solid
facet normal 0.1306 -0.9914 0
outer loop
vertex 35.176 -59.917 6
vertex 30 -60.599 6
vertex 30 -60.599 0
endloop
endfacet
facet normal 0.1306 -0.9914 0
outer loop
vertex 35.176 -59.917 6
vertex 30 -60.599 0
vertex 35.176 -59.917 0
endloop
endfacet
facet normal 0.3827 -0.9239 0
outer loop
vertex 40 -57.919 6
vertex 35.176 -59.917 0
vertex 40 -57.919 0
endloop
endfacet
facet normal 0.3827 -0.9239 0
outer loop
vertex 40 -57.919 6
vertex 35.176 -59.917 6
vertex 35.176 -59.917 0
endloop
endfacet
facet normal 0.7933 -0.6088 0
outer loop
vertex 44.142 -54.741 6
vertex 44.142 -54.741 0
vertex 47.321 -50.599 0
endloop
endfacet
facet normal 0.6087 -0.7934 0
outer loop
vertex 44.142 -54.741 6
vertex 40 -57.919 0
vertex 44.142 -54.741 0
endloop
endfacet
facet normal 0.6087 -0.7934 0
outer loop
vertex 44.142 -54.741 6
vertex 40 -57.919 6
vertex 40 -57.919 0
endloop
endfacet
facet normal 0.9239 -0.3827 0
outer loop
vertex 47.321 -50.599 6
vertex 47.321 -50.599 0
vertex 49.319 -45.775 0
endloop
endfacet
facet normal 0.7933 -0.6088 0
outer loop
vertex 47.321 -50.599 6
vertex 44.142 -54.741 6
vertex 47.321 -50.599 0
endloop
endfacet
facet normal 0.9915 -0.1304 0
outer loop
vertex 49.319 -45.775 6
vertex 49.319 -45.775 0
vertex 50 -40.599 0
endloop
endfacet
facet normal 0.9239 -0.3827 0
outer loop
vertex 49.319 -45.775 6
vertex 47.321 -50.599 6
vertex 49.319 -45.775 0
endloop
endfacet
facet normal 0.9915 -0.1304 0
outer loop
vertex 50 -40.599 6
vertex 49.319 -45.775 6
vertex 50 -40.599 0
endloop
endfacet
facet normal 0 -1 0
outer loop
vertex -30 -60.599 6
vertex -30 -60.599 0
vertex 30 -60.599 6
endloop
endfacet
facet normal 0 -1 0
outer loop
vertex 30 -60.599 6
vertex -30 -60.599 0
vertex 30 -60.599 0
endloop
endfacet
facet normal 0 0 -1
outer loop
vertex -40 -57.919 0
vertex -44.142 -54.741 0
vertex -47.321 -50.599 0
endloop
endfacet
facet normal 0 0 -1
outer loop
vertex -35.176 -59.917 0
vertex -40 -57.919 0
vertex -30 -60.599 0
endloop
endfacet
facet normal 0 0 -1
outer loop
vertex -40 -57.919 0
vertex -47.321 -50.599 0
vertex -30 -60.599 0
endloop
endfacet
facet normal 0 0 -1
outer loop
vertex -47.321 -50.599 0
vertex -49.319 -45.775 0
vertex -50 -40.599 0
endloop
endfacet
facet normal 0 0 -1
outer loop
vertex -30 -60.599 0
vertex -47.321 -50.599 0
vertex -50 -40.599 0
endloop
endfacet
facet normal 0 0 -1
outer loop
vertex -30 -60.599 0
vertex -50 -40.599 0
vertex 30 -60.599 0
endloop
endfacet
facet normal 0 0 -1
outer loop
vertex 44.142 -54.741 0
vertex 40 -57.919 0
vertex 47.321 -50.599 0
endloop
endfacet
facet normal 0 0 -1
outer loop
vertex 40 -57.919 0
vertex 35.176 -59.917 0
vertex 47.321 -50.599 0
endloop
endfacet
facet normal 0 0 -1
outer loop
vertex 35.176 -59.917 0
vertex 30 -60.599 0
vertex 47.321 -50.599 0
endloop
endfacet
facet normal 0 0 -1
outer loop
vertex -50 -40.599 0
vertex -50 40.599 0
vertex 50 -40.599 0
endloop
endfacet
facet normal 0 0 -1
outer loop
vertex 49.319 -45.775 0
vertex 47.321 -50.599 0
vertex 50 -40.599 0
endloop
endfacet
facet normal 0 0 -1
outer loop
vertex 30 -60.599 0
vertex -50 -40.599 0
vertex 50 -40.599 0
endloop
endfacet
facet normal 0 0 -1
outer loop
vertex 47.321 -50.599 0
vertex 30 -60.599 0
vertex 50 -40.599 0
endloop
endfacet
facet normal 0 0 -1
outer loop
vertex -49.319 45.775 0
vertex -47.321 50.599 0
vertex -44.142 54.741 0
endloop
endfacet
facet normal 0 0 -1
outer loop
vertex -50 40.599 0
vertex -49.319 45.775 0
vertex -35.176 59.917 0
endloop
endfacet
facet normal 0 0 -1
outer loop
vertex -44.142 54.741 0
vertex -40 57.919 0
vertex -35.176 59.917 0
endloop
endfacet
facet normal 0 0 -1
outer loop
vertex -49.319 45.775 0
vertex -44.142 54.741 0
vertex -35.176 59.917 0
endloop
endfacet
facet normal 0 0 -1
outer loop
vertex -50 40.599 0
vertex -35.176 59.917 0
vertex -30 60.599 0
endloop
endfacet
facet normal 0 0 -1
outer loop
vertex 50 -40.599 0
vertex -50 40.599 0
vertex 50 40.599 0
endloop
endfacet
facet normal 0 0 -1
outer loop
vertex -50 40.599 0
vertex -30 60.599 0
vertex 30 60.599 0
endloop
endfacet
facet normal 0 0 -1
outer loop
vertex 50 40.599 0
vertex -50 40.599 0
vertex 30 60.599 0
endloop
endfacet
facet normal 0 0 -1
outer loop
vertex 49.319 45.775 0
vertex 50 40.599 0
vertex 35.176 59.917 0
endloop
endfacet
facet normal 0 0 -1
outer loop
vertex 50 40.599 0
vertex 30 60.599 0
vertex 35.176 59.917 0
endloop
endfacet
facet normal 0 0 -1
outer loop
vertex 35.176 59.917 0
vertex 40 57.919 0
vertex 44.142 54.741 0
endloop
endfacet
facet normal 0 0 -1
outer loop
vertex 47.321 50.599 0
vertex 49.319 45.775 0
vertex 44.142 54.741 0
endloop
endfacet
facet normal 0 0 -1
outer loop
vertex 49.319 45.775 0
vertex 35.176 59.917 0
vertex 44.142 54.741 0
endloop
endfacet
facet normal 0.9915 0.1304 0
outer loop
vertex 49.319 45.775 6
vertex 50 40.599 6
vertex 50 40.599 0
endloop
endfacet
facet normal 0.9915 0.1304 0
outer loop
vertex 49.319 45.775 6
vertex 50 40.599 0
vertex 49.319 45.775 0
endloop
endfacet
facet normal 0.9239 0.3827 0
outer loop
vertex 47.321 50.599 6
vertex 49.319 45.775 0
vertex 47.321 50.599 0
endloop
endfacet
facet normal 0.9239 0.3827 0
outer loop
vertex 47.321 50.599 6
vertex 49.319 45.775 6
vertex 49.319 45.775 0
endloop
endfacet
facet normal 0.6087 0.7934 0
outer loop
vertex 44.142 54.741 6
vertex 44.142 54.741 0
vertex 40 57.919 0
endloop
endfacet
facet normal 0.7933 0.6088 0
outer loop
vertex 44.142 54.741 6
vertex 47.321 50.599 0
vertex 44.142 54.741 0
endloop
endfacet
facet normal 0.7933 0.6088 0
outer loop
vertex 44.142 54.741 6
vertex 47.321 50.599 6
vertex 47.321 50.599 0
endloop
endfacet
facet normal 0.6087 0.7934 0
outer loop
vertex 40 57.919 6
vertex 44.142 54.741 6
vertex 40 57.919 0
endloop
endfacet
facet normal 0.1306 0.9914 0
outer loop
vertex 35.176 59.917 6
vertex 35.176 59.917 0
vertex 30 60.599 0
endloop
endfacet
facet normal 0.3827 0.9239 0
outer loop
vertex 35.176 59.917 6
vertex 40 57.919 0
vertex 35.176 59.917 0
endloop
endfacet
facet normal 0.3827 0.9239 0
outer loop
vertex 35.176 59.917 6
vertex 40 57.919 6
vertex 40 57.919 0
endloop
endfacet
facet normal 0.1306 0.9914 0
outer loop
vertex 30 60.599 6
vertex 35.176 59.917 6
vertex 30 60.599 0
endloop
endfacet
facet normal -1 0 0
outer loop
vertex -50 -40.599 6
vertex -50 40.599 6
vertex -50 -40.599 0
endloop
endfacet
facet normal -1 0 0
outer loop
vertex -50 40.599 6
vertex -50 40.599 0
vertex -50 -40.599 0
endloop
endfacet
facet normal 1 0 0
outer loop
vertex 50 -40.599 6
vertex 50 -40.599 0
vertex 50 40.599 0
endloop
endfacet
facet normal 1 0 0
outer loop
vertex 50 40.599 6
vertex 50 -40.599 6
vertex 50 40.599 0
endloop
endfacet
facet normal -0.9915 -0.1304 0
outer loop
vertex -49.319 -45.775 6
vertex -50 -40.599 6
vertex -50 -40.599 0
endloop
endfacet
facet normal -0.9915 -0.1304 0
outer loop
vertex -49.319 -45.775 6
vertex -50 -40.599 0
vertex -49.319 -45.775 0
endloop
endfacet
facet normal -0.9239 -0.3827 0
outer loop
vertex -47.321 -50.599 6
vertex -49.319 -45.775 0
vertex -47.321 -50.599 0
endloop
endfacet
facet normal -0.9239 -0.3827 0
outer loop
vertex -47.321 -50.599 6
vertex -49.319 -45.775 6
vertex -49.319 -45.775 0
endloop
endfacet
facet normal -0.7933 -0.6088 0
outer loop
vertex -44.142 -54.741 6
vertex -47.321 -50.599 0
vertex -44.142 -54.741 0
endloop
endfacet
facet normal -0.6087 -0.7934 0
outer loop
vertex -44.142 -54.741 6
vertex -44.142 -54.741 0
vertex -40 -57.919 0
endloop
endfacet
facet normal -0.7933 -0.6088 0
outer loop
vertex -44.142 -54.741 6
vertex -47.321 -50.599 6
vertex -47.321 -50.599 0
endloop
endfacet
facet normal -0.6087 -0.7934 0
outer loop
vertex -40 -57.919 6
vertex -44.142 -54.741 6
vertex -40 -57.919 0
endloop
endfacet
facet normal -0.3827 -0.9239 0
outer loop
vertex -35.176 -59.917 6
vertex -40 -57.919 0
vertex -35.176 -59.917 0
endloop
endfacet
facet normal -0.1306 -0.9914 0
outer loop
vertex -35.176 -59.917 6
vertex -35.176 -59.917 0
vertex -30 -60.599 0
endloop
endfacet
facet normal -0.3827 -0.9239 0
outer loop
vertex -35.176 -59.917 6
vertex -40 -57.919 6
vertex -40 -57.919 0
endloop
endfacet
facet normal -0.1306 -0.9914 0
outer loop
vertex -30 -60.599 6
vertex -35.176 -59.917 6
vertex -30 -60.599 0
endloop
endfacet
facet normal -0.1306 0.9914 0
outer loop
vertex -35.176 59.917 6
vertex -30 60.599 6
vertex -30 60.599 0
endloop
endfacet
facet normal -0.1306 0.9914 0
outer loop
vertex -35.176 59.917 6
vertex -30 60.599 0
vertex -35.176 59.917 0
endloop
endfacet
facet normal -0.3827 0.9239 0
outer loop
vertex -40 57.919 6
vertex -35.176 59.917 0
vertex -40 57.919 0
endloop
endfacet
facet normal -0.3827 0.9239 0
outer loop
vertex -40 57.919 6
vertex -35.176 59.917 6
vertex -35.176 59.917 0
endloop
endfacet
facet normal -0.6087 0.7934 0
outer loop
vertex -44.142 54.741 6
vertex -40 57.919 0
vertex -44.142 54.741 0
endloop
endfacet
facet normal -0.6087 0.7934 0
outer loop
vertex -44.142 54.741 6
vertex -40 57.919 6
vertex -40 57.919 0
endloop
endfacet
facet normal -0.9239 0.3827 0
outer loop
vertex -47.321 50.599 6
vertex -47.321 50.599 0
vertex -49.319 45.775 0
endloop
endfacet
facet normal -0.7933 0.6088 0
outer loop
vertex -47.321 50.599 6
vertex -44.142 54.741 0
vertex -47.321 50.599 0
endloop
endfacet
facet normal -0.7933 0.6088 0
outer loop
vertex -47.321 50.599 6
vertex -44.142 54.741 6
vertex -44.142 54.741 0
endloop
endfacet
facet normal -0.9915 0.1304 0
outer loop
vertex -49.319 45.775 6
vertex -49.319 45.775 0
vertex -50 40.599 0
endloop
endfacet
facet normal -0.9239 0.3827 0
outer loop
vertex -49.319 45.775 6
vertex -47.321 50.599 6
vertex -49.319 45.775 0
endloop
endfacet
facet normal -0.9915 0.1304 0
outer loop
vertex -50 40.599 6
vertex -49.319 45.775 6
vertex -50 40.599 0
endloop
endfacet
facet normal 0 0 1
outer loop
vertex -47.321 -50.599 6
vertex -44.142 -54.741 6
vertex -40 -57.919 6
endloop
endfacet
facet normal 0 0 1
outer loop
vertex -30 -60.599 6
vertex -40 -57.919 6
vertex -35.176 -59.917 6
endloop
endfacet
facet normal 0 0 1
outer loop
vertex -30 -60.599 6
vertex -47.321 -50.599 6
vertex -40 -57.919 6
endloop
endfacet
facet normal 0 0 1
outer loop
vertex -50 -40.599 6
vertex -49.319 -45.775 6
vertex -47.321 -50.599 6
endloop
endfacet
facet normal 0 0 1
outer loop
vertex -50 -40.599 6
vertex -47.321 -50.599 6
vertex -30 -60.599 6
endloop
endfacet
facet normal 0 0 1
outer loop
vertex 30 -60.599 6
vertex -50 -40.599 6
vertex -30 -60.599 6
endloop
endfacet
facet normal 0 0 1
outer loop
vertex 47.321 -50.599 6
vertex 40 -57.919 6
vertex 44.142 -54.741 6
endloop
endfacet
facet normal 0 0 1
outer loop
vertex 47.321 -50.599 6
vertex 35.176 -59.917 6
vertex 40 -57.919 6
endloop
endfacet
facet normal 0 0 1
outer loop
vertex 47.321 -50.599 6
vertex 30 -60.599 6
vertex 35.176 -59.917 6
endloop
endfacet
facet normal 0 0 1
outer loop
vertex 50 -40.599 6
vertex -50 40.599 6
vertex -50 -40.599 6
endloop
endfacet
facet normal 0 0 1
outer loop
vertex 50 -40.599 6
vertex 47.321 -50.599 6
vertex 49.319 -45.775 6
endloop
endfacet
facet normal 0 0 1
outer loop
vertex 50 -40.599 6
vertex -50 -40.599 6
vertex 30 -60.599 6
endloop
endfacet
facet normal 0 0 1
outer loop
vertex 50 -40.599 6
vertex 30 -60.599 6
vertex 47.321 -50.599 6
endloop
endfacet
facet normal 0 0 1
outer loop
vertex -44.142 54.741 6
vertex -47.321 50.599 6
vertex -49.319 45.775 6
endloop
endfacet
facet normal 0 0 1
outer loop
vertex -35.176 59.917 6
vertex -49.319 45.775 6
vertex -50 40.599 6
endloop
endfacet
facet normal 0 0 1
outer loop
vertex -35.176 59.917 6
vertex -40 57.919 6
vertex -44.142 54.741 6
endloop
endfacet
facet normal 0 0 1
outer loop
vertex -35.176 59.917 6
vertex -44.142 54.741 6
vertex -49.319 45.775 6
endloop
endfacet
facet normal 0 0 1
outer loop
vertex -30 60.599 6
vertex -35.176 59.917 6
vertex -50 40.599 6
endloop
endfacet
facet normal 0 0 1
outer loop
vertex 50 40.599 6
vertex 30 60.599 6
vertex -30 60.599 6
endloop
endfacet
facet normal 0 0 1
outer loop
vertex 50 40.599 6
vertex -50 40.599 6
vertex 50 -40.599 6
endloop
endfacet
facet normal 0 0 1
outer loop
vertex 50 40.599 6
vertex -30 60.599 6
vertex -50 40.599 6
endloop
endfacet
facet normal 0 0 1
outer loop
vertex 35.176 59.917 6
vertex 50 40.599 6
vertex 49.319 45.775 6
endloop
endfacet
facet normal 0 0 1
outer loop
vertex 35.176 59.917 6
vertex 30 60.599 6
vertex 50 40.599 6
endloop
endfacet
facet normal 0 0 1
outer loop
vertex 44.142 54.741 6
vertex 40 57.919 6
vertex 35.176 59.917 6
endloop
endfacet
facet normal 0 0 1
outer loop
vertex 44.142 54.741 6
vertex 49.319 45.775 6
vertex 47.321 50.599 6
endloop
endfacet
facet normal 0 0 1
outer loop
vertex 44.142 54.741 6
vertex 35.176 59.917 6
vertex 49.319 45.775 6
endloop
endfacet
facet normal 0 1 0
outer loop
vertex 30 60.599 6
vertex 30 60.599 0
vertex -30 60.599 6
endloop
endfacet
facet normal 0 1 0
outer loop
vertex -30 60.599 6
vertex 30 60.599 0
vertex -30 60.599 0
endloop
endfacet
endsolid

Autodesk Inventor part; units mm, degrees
ref_plane "YZ Plane" through (0, 0, 0) normal (1, 0, 0) x (0, 1, 0)
ref_plane "XZ Plane" through (0, 0, 0) normal (0, 1, 0) x (-1, 0, 0)
ref_plane "XY Plane" through (0, 0, 0) normal (0, 0, 1) x (1, 0, 0)
sketch "Sketch1" plane through (0, 0, 0) normal (0, 0, 1) x (1, 0, 0)
  line L0 (-50, -60.5988) -> (50, -60.5988)
  line L1 (50, -60.5988) -> (50, 60.5988)
  line L2 (50, 60.5988) -> (-50, 60.5988)
  line L3 (-50, 60.5988) -> (-50, -60.5988)
  line L4 (-50, -60.5988) -> (50, 60.5988) construction
  line L5 (50, -60.5988) -> (-50, 60.5988) construction
  point P0 (0, 0)
  dimension "d0" = 100
  dimension "d1" = 121.1976
extrude "Plate1" add sketch "Sketch1" along normal blind 6
fillet "Corner Round1" radius 20 4 edges at (50, -60.5988, 3) (-50, -60.5988, 3) (-50, 60.5988, 3) (50, 60.5988, 3)
sketch "Sketch5" plane through (0, 0, 6) normal (0, 0, 1) x (1, 0, 0)
  line L0 (50, 40.5988) -> (50, -40.5988) projected
  line L1 (50, 30.5988) -> (-50, 30.5988)
  line L2 (-50, -40.5988) -> (-50, 40.5988) projected
  line L3 (-30, 60.5988) -> (30, 60.5988) projected
  point P0 (0, 0)
  dimension "d23" = 30
feature "Fold1" [suppressed]
equation "\"d1\" = Legs_Upper_plate_lenght"
equation "\"d2\" = Thickness"
equation "\"d24\" = BendReliefWidth"
equation "\"d25\" = BendReliefDepth"
equation "\"d26\" = MinimumRemnant"
equation "\"d27\" = TransitionRadius"
equation "\"d29\" = BendRadius"
equation "\"BendReliefWidth\" = Thickness"
equation "\"BendReliefDepth\" = 0.5 * Thickness"
equation "\"CornerReliefSize\" = 4 * Thickness"
equation "\"MinimumRemnant\" = 2 * Thickness"
equation "\"TransitionRadius\" = BendRadius"
equation "\"JacobiRadiusSize\" = BendRadius"
equation "\"GapSize\" = Thickness"
equation "\"Legs_Upper_plate_lenght\" = 121.197614"
equation "\"Thickness\" = 6"
equation "\"BendRadius\" = 5"
properties part number "PRS 9694 leg plate for filter_D1200 940" material "Stainless Steel"
